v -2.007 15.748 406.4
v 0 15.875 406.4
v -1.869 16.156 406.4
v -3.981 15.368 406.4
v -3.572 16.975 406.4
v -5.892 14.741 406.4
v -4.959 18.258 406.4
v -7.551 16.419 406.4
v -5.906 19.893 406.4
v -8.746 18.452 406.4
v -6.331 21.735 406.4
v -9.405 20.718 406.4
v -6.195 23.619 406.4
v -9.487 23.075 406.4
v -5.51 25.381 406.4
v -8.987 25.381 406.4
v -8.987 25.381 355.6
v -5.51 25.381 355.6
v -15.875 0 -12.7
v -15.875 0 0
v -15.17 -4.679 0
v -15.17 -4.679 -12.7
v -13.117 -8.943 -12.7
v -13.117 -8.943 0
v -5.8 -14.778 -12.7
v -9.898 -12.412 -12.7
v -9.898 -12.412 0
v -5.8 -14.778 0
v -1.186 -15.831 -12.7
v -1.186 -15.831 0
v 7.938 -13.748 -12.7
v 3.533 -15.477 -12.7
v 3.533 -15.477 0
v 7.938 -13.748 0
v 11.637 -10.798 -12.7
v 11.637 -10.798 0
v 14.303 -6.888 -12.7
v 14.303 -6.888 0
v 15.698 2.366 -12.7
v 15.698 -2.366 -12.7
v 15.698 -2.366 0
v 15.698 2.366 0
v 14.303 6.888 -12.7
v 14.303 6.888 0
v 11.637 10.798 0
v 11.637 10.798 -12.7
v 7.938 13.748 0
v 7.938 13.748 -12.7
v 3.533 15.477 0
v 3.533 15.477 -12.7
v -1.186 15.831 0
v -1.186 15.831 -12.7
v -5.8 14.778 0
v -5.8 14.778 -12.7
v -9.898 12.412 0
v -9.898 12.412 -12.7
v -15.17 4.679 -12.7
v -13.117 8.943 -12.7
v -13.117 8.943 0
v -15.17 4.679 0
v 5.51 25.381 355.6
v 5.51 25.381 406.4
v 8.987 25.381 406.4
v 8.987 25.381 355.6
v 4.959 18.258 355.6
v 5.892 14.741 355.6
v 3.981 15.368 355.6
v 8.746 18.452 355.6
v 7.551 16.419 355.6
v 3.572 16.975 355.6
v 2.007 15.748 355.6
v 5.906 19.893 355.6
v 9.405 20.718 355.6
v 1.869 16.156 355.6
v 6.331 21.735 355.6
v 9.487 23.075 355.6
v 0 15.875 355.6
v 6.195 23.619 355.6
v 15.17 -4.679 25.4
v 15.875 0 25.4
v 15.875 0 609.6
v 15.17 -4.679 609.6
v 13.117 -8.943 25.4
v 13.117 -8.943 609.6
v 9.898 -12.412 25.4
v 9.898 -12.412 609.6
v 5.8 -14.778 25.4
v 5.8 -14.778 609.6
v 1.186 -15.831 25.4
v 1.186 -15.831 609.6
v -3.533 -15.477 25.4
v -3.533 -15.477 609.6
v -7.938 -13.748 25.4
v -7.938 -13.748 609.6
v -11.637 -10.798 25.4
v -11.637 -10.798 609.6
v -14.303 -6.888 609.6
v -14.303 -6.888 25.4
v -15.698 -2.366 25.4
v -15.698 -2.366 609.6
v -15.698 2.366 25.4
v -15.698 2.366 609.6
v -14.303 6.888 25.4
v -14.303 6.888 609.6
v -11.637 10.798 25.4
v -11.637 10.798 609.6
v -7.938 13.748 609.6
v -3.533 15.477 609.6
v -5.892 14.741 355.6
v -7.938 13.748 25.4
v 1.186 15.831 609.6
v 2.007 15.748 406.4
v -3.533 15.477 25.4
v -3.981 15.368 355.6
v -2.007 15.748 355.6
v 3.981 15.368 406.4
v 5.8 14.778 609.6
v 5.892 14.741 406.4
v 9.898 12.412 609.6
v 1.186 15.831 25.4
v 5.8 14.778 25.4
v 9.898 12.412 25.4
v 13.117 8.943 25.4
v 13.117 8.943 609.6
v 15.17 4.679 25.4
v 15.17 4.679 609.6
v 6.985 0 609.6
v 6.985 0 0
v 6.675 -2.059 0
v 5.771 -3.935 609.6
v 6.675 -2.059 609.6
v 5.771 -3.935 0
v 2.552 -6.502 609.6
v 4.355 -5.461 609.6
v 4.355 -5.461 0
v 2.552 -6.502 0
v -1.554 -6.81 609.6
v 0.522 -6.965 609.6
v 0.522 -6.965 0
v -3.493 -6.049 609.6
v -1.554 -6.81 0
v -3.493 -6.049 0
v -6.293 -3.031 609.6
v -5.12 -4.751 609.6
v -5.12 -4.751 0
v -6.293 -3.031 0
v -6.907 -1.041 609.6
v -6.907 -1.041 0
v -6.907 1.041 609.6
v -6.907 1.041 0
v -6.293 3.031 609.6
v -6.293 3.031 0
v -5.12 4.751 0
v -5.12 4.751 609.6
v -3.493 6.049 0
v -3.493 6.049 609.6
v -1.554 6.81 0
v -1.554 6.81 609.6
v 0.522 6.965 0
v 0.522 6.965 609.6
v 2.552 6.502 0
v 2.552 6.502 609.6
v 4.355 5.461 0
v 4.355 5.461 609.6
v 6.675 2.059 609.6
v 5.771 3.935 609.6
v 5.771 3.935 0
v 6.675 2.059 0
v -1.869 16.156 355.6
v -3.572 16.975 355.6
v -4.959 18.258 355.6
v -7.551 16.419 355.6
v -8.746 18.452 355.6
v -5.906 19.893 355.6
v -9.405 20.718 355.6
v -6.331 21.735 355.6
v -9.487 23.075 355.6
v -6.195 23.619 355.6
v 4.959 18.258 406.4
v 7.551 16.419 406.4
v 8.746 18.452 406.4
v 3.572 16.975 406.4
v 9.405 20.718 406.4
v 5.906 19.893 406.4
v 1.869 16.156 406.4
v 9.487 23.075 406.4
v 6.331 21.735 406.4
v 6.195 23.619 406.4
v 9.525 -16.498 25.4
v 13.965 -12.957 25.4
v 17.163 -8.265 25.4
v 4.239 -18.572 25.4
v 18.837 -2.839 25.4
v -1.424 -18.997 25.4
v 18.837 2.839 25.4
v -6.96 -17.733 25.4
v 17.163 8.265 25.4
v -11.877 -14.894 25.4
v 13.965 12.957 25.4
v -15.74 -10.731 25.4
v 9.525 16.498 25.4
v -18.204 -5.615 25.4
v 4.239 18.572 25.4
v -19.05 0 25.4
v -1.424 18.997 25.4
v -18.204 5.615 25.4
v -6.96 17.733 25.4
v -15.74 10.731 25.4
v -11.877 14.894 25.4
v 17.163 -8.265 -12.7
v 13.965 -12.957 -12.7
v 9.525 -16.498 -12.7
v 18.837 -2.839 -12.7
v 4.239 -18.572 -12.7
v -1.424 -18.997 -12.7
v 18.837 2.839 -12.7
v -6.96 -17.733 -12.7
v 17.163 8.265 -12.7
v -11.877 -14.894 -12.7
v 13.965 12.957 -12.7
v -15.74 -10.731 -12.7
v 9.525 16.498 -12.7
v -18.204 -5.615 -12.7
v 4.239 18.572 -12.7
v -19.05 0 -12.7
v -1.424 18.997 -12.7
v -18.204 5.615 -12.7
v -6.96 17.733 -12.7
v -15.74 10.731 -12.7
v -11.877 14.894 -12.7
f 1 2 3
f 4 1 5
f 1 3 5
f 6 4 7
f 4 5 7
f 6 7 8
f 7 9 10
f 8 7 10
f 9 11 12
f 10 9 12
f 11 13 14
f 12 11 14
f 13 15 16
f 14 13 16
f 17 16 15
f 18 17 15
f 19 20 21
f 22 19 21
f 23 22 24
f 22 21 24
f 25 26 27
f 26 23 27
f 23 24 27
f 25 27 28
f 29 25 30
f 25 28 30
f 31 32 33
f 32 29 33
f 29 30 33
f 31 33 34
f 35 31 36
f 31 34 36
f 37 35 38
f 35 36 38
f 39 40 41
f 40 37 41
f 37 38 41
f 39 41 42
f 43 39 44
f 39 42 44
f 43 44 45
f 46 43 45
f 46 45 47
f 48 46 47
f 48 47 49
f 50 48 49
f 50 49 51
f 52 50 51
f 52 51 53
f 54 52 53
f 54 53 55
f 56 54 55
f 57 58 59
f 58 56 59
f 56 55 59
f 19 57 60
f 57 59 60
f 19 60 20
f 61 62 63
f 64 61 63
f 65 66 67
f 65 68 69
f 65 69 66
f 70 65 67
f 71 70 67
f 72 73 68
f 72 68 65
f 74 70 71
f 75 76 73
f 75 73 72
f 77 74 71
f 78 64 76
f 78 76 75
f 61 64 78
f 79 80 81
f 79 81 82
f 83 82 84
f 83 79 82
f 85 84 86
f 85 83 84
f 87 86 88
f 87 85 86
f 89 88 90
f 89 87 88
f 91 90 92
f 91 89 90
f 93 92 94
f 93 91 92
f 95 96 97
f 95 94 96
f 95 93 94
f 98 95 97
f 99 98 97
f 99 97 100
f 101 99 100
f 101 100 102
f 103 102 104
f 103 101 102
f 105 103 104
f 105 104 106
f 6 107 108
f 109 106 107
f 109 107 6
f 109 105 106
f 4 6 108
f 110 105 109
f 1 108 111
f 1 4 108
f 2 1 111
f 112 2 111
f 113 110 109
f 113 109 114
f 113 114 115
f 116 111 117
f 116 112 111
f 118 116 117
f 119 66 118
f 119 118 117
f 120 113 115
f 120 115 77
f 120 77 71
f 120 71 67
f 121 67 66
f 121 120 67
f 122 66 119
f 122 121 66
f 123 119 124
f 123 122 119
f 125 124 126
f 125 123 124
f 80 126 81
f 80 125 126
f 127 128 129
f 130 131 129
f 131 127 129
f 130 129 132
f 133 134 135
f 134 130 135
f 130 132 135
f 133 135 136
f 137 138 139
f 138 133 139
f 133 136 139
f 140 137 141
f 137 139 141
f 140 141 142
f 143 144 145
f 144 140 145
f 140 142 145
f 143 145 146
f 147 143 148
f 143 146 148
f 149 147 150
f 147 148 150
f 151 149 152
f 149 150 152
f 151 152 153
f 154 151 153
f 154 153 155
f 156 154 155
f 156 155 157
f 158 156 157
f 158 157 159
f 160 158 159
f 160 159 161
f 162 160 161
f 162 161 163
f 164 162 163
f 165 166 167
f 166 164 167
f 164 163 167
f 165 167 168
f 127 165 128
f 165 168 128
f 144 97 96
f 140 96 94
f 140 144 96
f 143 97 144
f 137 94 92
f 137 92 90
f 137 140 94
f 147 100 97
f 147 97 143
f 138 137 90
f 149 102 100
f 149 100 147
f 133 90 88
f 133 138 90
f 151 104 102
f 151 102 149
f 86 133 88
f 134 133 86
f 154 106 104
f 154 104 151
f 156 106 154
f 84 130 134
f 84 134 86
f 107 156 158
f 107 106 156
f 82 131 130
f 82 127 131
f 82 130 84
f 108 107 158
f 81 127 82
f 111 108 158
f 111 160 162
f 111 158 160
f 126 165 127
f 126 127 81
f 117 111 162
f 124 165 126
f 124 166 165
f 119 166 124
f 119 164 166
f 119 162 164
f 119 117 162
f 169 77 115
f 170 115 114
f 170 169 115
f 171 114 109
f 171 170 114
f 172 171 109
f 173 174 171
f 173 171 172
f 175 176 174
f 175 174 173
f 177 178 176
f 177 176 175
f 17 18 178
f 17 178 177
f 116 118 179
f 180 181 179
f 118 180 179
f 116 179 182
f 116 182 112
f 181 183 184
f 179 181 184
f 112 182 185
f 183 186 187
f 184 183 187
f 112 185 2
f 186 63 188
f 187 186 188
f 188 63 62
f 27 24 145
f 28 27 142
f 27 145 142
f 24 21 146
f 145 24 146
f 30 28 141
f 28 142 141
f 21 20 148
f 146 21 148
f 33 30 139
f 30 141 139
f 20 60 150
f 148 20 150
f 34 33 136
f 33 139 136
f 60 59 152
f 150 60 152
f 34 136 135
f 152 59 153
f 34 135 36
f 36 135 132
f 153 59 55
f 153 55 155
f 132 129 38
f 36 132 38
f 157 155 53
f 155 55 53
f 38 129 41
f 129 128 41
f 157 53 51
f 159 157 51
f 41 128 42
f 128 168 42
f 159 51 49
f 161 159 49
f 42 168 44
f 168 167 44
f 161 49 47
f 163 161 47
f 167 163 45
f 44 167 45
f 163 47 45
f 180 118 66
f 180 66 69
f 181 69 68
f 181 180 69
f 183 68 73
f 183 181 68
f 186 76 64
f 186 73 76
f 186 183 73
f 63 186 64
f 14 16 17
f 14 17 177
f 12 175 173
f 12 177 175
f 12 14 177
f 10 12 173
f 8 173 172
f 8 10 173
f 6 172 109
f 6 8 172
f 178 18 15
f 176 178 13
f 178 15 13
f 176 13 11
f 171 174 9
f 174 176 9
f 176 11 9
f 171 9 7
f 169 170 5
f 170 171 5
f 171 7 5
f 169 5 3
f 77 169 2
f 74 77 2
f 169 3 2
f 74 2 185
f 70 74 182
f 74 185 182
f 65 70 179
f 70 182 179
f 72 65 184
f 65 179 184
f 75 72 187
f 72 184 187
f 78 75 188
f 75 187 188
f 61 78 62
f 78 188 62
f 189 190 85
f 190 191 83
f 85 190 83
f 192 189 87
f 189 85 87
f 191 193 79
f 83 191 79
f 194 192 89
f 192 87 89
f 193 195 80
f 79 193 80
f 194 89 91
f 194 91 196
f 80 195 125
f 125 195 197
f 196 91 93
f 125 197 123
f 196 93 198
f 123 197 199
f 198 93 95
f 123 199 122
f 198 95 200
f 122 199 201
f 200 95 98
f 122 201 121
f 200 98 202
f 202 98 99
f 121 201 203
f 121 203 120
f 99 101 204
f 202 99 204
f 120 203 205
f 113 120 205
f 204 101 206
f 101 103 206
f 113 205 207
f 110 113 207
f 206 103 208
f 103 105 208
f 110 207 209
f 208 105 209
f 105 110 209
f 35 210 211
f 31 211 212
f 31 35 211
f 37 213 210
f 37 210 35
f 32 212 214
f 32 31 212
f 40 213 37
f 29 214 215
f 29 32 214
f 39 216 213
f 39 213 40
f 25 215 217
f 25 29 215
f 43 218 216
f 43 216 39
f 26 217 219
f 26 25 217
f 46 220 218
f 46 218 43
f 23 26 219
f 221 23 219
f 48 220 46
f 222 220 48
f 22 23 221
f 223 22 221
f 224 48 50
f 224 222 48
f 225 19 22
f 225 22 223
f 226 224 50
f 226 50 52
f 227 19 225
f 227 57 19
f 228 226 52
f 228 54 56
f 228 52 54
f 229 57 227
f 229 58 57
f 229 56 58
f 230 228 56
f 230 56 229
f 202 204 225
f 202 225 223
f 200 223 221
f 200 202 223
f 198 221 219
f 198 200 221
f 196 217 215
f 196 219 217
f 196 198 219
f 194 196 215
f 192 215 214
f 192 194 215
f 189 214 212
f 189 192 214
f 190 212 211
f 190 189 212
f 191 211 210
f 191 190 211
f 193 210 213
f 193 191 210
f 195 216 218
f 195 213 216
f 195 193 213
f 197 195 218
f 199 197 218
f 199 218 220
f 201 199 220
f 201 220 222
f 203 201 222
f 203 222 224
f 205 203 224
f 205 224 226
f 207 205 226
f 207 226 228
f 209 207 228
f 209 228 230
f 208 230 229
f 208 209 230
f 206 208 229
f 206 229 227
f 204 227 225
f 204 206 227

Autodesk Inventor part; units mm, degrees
ref_plane "YZ Plane" through (0, 0, 0) normal (1, 0, 0) x (0, 1, 0)
ref_plane "XZ Plane" through (0, 0, 0) normal (0, 1, 0) x (-1, 0, 0)
ref_plane "XY Plane" through (0, 0, 0) normal (0, 0, 1) x (1, 0, 0)
sketch "Sketch1" plane through (0, 0, 0) normal (0, 0, 1) x (1, 0, 0)
  circle A0 centre (0, 0) radius 6.985
  circle A1 centre (0, 0) radius 15.875
  dimension "d0" = 13.97
  dimension "d1" = 31.75
extrude "Extrusion1" add sketch "Sketch1" along normal blind 609.6
ref_plane "Work Plane1" through (0, 0, 25.4) normal (0, 0, -1) x (-1, 0, 0)
sketch "Sketch2" plane through (0, 0, 25.4) normal (0, 0, -1) x (-1, 0, 0)
  circle A0 centre (0, 0) radius 19.05
  circle A1 centre (0, 0) radius 15.875
  dimension "d5" = 38.1
extrude "Extrusion2" add sketch "Sketch2" along normal blind 38.1
ref_plane "Work Plane2" through (0, 0, 406.4) normal (0, 0, -1) x (-1, 0, 0)
sketch "Sketch4" plane through (0, 0, 406.4) normal (0, 0, -1) x (-1, 0, 0)
  circle A0 centre (0, 0) radius 15.875 projected
  arc A1 (-5.5104, 25.3806) -> (5.5104, 25.3806) centre (0, 22.225) ccw
  line L0 (8.9871, 25.3806) -> (5.5104, 25.3806)
  line L1 (-5.5104, 25.3806) -> (-8.9871, 25.3806)
  arc A2 (-8.9871, 25.3806) -> (-5.8921, 14.7411) centre (0, 22.225) ccw
  arc A3 (5.8921, 14.7411) -> (8.9871, 25.3806) centre (0, 22.225) ccw
  line L2 (5.8921, 14.7411) -> (-5.8921, 14.7411)
  point P0 (0, 15.875)
extrude "Extrusion3" add sketch "Sketch4" along normal blind 50.8 contours A0 A1 L0 A3 | A2 L1 A1 A0
ref_plane "Work Plane4" through (0, 0, 228.6) normal (0, 0, -1) x (-1, 0, 0)
sketch "Sketch6" plane through (0, 0, 228.6) normal (0, 0, -1) x (-1, 0, 0)
  circle A0 centre (0, 0) radius 15.875
  circle A1 centre (0, 0) radius 28.575
  circle A2 centre (0, 0) radius 22.225
  circle A3 centre (-22.225, 0) radius 6.35
  dimension "d23" = 44.45
  dimension "d22" = 57.15
  dimension "d24" = 12.7
properties part number "Blow Dart"
